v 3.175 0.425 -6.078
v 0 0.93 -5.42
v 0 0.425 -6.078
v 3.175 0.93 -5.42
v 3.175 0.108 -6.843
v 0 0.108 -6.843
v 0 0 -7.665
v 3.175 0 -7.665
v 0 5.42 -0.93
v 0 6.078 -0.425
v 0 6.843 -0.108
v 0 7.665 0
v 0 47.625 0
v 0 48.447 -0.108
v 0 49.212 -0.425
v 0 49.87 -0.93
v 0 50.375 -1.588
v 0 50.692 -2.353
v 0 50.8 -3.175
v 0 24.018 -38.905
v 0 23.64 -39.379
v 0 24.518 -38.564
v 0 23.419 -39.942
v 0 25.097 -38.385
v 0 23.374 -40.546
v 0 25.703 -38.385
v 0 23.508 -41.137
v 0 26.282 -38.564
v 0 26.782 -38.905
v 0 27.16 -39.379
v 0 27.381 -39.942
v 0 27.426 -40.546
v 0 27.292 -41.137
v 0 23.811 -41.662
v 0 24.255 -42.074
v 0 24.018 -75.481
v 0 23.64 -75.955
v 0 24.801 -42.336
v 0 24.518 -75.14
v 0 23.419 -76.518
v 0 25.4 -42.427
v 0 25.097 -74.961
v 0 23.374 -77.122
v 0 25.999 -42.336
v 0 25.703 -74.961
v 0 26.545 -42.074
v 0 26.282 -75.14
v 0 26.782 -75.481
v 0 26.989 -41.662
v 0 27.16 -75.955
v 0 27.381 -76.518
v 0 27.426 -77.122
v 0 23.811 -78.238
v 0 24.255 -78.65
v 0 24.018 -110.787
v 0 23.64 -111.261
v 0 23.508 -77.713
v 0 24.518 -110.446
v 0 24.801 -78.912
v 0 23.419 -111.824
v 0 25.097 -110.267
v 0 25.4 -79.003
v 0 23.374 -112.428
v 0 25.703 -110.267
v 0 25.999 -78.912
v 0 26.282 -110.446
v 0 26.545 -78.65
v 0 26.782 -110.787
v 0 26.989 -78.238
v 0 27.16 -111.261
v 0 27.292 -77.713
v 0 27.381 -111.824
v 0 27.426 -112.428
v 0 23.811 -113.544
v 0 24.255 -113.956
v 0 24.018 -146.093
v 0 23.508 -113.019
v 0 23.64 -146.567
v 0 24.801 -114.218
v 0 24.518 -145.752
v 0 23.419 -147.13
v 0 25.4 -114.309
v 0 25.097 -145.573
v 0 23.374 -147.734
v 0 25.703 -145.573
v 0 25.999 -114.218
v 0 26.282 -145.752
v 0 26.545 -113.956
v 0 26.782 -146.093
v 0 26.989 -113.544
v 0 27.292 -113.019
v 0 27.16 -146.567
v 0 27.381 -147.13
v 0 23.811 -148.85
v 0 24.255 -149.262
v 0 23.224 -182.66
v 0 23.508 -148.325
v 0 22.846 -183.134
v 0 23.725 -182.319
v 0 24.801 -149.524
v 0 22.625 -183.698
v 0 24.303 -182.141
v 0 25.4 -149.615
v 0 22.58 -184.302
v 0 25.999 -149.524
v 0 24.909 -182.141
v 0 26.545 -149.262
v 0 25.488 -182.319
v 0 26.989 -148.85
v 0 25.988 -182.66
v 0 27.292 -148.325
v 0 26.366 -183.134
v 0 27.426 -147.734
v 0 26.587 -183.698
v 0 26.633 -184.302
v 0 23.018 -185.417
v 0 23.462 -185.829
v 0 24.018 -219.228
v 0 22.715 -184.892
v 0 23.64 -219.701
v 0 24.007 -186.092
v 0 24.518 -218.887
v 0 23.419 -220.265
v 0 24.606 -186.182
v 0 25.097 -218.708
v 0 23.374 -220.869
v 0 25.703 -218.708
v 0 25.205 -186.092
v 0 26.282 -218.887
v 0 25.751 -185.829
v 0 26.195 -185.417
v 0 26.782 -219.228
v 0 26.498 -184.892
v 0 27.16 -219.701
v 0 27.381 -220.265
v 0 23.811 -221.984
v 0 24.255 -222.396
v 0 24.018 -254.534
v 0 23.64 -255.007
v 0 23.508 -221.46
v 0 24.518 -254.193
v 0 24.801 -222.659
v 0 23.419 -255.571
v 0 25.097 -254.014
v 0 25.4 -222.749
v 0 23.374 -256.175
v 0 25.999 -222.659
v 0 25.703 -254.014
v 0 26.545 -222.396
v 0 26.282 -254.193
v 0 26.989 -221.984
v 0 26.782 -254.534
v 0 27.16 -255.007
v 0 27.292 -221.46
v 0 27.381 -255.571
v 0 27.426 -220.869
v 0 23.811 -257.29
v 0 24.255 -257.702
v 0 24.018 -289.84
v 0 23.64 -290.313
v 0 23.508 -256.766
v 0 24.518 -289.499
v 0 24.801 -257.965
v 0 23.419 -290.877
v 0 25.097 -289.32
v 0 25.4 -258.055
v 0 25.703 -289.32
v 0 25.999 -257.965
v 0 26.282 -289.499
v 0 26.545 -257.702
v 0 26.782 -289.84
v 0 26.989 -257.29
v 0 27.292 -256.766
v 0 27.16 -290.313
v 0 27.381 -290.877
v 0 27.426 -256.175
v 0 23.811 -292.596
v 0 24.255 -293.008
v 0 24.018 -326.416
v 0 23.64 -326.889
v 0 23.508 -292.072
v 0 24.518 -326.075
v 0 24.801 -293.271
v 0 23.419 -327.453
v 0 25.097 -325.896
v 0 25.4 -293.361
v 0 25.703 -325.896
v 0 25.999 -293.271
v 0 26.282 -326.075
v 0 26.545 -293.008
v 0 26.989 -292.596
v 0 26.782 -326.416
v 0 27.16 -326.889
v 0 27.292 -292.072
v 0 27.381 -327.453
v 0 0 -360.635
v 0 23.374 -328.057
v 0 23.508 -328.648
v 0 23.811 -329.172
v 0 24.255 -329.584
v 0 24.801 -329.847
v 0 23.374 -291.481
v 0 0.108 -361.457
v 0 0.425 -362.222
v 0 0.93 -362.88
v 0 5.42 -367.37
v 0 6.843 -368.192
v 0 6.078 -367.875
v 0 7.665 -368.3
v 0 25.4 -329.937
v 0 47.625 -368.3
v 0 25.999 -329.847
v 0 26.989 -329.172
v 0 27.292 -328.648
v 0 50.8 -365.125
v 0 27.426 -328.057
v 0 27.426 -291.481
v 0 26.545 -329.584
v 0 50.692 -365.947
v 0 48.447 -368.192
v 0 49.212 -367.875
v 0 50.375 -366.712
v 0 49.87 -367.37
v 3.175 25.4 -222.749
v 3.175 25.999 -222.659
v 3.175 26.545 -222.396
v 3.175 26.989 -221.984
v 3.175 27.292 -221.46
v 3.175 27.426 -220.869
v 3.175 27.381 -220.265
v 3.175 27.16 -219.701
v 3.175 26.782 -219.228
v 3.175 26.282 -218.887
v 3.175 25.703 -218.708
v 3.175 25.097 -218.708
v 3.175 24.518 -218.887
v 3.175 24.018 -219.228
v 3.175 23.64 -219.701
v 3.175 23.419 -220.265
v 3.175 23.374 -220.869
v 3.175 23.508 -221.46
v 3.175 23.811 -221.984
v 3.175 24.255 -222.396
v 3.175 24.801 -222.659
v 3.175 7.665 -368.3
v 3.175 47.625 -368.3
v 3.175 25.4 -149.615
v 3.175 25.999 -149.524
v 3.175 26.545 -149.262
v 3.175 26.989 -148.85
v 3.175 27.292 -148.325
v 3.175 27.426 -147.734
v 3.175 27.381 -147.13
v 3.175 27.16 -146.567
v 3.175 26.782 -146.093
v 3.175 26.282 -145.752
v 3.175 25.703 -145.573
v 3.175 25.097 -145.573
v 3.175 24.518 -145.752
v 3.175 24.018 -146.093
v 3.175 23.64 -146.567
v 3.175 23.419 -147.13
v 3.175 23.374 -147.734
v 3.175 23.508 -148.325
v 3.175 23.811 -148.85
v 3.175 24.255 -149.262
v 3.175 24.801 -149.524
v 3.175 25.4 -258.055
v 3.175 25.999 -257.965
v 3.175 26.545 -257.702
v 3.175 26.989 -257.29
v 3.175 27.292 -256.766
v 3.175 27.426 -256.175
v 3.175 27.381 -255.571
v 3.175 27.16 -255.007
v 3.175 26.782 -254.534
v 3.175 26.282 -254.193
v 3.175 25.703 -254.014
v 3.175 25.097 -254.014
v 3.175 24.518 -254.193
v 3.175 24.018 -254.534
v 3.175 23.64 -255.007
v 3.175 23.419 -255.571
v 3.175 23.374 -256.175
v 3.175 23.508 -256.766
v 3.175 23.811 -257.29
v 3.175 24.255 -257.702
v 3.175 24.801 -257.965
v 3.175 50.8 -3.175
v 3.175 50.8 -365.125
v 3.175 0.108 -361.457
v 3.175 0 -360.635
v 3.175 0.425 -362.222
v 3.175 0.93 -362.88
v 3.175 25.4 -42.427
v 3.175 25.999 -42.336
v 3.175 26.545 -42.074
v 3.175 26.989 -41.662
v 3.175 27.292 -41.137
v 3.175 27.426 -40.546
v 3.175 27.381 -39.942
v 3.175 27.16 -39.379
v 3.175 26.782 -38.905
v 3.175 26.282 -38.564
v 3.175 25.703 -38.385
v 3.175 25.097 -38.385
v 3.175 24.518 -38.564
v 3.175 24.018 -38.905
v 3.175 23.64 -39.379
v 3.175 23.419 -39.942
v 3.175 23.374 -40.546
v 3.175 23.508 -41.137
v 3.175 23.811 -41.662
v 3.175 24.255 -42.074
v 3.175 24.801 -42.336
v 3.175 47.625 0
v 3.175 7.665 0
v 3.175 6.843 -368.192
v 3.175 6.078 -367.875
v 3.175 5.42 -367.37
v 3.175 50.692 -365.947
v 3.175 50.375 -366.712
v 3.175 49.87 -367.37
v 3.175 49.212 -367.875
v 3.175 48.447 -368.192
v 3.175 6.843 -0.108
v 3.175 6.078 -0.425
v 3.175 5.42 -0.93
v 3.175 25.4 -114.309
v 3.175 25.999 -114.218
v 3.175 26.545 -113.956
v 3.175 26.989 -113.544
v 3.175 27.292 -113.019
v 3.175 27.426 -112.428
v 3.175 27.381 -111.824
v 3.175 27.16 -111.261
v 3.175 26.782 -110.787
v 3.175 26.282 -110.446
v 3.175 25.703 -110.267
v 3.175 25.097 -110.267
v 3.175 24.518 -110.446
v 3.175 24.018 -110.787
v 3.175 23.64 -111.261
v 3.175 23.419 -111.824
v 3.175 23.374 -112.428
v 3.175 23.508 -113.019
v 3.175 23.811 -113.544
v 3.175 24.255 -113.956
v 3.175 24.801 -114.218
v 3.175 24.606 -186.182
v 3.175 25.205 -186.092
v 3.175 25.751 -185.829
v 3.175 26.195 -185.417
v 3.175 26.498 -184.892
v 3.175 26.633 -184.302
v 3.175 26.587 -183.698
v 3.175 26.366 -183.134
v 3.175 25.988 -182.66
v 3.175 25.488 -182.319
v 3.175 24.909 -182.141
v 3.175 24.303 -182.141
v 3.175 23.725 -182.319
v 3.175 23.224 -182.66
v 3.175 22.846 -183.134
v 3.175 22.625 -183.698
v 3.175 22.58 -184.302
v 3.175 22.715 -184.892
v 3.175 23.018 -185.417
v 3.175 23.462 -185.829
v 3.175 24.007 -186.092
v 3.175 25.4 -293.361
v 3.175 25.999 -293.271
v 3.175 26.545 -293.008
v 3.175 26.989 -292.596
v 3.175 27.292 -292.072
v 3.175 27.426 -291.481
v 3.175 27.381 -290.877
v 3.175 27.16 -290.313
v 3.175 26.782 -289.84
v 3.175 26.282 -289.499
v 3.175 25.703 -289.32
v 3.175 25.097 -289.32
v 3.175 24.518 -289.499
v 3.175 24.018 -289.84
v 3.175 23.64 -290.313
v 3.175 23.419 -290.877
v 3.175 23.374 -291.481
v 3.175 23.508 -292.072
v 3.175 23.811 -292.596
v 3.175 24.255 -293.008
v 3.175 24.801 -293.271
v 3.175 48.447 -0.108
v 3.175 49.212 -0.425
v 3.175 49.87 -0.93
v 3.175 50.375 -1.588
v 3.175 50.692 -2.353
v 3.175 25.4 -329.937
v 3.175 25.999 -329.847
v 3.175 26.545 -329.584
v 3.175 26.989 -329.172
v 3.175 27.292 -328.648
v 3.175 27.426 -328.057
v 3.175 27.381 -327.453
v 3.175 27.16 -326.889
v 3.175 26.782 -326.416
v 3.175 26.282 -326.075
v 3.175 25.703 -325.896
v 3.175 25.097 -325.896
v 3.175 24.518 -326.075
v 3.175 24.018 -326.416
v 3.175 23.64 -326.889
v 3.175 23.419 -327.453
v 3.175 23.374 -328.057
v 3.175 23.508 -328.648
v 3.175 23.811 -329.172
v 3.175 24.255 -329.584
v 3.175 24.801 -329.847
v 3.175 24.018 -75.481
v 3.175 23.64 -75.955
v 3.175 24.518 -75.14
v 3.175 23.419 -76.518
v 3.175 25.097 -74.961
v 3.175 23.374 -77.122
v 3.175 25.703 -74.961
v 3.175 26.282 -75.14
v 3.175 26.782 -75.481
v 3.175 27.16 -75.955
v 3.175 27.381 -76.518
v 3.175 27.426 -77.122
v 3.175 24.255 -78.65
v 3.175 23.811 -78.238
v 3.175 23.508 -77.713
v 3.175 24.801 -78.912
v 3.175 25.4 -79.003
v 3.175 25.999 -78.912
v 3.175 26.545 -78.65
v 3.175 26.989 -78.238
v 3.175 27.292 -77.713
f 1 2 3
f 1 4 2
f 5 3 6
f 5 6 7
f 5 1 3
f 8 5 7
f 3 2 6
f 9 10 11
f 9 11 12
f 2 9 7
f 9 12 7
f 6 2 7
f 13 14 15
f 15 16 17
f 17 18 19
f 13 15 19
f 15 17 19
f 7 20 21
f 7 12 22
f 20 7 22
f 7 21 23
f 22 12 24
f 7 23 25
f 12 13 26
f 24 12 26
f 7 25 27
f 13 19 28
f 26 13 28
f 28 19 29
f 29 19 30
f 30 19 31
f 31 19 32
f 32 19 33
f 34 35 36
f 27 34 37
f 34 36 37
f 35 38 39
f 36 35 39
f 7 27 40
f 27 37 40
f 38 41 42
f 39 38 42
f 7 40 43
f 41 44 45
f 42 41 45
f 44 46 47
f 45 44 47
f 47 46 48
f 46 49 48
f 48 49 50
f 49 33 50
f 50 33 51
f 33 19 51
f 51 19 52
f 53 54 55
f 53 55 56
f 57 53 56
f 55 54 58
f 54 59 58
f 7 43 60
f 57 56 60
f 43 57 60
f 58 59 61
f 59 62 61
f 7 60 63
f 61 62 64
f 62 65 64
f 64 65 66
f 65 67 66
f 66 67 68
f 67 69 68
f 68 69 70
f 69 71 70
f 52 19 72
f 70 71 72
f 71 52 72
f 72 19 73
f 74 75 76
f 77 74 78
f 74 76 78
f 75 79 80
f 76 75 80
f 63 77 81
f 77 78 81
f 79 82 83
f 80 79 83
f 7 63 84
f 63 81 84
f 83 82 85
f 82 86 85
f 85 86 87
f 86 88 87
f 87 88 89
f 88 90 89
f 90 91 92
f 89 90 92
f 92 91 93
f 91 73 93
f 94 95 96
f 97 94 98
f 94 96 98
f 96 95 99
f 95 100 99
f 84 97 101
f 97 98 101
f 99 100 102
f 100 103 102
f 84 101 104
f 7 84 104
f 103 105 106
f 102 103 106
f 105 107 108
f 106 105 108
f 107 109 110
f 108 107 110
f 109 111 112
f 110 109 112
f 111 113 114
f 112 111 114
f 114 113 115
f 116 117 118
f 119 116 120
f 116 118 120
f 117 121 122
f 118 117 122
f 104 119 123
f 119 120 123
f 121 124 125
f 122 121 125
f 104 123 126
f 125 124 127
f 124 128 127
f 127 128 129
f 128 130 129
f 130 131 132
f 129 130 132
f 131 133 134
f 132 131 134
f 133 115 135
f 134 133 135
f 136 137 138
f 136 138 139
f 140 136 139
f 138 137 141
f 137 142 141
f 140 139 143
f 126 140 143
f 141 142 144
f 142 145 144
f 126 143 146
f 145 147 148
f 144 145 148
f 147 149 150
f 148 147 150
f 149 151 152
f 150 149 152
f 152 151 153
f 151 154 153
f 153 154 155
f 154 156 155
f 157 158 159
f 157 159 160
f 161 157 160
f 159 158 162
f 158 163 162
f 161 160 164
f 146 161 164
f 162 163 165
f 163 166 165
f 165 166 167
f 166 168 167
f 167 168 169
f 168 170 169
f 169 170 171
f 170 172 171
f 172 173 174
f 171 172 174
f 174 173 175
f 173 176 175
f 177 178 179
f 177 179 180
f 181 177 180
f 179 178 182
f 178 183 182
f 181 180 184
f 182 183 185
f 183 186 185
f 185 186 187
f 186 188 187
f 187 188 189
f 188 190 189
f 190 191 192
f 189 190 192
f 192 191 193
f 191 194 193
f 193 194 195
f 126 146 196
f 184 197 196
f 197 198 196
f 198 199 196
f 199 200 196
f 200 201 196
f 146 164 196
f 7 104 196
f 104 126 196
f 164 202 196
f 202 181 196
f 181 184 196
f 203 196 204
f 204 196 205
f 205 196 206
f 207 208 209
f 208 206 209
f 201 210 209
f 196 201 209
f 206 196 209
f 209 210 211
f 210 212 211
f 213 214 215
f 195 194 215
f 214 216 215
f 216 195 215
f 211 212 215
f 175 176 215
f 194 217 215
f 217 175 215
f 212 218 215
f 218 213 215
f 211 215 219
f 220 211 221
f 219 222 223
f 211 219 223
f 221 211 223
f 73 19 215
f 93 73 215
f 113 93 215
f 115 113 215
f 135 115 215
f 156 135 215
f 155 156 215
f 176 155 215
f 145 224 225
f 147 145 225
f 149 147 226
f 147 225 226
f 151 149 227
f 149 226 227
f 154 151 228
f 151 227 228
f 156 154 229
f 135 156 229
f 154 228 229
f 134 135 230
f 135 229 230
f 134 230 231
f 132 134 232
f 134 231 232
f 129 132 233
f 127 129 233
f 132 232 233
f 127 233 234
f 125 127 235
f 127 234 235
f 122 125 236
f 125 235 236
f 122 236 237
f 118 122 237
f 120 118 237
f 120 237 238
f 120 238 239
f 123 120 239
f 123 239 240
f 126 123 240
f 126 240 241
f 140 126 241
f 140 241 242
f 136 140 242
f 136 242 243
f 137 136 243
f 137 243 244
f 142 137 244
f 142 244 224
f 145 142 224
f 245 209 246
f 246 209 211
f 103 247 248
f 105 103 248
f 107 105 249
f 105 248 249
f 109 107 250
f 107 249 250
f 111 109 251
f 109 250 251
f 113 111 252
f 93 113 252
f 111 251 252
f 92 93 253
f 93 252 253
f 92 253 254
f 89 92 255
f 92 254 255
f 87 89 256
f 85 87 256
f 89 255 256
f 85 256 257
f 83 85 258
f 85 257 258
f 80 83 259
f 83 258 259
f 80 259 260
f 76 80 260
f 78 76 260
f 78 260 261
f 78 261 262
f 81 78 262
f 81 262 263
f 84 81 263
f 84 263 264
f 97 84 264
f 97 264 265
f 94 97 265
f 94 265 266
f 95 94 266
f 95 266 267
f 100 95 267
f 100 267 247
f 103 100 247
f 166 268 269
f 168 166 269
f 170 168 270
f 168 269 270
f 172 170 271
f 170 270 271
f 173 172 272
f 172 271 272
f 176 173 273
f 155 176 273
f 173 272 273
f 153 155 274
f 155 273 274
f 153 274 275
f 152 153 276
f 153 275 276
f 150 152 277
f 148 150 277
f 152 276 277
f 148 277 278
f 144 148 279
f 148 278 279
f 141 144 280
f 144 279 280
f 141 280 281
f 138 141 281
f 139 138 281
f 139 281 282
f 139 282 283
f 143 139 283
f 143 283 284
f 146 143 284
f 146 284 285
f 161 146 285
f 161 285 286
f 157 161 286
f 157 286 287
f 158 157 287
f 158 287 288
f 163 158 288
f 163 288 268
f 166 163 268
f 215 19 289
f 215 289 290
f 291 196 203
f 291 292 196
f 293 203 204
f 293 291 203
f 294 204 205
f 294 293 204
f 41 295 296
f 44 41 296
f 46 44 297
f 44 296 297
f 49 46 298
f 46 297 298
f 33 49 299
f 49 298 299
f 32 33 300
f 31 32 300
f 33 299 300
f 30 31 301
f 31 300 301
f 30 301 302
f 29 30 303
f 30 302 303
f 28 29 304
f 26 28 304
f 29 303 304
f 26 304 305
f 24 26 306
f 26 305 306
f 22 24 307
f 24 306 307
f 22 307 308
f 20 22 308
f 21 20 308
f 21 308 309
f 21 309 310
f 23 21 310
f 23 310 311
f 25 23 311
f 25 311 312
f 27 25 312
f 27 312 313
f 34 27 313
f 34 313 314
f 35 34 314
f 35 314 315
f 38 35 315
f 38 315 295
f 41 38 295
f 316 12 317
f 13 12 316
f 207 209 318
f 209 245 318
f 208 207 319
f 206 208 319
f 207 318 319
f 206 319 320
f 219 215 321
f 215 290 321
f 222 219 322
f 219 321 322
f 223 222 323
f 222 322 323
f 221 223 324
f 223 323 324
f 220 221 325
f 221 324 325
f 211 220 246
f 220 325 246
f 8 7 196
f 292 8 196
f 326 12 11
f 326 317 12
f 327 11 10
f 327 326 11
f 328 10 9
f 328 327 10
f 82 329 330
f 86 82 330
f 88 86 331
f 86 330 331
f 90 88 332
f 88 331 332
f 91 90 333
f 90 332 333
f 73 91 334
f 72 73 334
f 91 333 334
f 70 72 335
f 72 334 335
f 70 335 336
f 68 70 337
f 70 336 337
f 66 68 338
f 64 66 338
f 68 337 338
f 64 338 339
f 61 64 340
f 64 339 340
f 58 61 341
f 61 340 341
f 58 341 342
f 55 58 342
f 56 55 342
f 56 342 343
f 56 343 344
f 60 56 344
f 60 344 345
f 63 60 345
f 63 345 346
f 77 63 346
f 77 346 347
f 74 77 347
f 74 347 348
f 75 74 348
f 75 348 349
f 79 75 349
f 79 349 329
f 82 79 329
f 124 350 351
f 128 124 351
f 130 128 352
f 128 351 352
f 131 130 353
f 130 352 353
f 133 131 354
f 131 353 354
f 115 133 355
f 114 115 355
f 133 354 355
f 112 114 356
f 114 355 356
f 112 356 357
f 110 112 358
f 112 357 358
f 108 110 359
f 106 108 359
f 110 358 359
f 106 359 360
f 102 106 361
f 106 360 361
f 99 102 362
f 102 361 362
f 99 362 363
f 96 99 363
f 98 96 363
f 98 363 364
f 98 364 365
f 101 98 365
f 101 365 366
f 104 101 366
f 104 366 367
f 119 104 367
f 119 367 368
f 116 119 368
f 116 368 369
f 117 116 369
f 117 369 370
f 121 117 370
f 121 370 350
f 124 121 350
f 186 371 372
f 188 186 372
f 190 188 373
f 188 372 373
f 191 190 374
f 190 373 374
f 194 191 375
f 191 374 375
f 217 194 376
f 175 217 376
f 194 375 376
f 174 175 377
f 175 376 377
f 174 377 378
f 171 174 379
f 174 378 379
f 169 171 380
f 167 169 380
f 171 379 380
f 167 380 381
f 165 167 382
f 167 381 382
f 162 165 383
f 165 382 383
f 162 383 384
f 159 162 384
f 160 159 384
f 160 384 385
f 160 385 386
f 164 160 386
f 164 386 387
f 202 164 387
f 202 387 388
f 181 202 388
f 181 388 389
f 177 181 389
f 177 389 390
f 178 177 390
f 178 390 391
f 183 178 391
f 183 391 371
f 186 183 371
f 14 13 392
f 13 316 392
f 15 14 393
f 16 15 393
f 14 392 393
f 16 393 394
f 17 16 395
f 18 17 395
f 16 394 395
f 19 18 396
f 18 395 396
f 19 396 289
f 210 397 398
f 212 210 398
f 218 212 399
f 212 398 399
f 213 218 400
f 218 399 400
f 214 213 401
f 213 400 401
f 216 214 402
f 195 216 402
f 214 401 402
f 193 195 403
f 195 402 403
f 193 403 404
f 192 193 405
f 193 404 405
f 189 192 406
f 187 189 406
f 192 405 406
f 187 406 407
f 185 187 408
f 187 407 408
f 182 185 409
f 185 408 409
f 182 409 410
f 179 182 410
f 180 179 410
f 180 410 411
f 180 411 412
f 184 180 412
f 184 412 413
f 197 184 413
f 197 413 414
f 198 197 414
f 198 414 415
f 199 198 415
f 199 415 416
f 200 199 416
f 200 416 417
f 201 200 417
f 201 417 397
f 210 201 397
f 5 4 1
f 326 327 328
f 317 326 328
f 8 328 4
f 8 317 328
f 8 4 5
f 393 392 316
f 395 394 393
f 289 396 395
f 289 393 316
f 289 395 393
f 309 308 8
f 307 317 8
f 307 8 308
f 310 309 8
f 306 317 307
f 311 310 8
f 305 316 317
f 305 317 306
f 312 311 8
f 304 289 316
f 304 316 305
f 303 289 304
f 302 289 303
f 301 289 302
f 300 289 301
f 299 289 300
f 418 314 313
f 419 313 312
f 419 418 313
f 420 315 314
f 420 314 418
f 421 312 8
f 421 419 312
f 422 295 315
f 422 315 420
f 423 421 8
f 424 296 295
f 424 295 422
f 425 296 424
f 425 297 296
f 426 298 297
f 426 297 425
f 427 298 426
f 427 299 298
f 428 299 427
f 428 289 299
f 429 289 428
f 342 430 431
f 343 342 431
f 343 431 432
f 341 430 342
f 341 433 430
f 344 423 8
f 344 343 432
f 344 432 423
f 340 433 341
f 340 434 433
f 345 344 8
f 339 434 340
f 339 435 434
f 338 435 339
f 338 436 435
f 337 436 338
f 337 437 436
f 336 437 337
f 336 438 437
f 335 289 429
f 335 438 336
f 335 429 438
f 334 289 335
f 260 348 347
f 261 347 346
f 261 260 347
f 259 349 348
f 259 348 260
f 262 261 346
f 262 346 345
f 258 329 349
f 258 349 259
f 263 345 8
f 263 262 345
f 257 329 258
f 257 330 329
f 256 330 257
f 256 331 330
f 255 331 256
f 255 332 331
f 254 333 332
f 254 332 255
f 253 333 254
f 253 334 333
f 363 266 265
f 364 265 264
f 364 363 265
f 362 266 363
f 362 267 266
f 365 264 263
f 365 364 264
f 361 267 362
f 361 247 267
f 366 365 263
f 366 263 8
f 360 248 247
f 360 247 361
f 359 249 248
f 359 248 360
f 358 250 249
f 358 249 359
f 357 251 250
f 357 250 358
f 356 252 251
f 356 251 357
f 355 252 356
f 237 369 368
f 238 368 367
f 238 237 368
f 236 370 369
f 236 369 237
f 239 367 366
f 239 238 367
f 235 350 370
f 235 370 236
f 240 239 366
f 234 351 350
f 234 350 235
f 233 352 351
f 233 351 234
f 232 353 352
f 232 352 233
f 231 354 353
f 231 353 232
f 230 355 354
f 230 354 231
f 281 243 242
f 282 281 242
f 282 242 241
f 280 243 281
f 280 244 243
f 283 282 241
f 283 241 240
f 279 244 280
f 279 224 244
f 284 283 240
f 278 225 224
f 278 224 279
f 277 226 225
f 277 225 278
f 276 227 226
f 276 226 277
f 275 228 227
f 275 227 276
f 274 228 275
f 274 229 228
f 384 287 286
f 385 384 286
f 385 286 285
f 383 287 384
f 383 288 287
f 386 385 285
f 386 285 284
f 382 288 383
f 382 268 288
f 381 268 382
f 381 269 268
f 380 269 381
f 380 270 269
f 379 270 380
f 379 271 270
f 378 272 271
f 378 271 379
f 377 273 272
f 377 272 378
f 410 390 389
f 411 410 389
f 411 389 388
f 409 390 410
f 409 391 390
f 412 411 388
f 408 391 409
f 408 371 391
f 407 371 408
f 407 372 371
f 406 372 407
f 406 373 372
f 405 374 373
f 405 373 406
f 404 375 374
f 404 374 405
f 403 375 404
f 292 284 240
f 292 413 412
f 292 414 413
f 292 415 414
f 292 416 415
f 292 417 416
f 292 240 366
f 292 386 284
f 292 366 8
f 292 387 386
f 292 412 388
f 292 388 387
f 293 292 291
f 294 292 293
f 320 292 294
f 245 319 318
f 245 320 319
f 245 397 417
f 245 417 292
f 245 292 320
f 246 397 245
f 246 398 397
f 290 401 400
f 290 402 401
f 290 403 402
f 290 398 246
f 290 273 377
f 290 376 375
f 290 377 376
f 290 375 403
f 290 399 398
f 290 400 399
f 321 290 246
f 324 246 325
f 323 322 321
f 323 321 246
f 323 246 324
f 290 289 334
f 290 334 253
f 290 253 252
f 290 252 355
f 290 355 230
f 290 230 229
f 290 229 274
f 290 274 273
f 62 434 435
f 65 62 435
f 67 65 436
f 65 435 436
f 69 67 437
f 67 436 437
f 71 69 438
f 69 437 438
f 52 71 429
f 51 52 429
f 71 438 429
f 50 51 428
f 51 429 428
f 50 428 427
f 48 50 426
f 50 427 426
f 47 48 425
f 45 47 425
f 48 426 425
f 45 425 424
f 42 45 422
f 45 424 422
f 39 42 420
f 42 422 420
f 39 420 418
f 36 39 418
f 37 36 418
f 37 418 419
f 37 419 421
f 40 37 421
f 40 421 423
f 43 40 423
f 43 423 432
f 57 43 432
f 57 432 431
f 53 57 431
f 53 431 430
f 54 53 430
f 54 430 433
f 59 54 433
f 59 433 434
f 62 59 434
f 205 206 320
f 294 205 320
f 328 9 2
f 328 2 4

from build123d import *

# Parameters (mm, degrees)
SKETCH1_W           = 368.3
SKETCH1_H           = 50.8
BOSS_EXTRUDE1_DEPTH = 3.175
SKETCH2_R           = 2.032
CUT_EXTRUDE1_DEPTH  = 372.80049842
CHAMFER1_SIZE       = 6.35
FILLET1_R           = 3.175


with BuildPart() as part:
    # Sketch1 → Boss-Extrude1 (new body)
    with BuildSketch(Plane(origin=(0, 0, 0), x_dir=(0, 0, -1), z_dir=(1, 0, 0))):
        with Locations((184.15, 25.4)):
            Rectangle(SKETCH1_W, SKETCH1_H)
    extrude(amount=BOSS_EXTRUDE1_DEPTH)

    # Sketch2 → Cut-Extrude1 (cut, through all)
    with BuildSketch(Plane(origin=(3.175, 0, 0), x_dir=(0, 0, -1), z_dir=(1, 0, 0))):
        with Locations((327.905386247, 25.4)):
            Circle(SKETCH2_R)
        with Locations((291.329386247, 25.4)):
            Circle(SKETCH2_R)
        with Locations((256.023386247, 25.4)):
            Circle(SKETCH2_R)
        with Locations((220.717386247, 25.4)):
            Circle(SKETCH2_R)
        with Locations((184.15, 24.60625)):
            Circle(SKETCH2_R)
        with Locations((147.582613753, 25.4)):
            Circle(SKETCH2_R)
        with Locations((112.276613753, 25.4)):
            Circle(SKETCH2_R)
        with Locations((76.970613753, 25.4)):
            Circle(SKETCH2_R)
        with Locations((40.394613753, 25.4)):
            Circle(SKETCH2_R)
    extrude(amount=-CUT_EXTRUDE1_DEPTH, mode=Mode.SUBTRACT)

    # Chamfer1
    chamfer1_edges = [part.edges().sort_by_distance(p)[0] for p in [
        (1.5875, 0, -368.3),
        (1.5875, 0, 0),
    ]]
    chamfer(chamfer1_edges, length=CHAMFER1_SIZE)

    # Fillet1
    fillet1_edges = [part.edges().sort_by_distance(p)[0] for p in [
        (1.5875, 0, -361.95),
        (1.5875, 0, -6.35),
        (1.5875, 6.35, 0),
        (1.5875, 6.35, -368.3),
        (1.5875, 50.8, 0),
        (1.5875, 50.8, -368.3),
    ]]
    fillet(fillet1_edges, radius=FILLET1_R)


solid = part.part
